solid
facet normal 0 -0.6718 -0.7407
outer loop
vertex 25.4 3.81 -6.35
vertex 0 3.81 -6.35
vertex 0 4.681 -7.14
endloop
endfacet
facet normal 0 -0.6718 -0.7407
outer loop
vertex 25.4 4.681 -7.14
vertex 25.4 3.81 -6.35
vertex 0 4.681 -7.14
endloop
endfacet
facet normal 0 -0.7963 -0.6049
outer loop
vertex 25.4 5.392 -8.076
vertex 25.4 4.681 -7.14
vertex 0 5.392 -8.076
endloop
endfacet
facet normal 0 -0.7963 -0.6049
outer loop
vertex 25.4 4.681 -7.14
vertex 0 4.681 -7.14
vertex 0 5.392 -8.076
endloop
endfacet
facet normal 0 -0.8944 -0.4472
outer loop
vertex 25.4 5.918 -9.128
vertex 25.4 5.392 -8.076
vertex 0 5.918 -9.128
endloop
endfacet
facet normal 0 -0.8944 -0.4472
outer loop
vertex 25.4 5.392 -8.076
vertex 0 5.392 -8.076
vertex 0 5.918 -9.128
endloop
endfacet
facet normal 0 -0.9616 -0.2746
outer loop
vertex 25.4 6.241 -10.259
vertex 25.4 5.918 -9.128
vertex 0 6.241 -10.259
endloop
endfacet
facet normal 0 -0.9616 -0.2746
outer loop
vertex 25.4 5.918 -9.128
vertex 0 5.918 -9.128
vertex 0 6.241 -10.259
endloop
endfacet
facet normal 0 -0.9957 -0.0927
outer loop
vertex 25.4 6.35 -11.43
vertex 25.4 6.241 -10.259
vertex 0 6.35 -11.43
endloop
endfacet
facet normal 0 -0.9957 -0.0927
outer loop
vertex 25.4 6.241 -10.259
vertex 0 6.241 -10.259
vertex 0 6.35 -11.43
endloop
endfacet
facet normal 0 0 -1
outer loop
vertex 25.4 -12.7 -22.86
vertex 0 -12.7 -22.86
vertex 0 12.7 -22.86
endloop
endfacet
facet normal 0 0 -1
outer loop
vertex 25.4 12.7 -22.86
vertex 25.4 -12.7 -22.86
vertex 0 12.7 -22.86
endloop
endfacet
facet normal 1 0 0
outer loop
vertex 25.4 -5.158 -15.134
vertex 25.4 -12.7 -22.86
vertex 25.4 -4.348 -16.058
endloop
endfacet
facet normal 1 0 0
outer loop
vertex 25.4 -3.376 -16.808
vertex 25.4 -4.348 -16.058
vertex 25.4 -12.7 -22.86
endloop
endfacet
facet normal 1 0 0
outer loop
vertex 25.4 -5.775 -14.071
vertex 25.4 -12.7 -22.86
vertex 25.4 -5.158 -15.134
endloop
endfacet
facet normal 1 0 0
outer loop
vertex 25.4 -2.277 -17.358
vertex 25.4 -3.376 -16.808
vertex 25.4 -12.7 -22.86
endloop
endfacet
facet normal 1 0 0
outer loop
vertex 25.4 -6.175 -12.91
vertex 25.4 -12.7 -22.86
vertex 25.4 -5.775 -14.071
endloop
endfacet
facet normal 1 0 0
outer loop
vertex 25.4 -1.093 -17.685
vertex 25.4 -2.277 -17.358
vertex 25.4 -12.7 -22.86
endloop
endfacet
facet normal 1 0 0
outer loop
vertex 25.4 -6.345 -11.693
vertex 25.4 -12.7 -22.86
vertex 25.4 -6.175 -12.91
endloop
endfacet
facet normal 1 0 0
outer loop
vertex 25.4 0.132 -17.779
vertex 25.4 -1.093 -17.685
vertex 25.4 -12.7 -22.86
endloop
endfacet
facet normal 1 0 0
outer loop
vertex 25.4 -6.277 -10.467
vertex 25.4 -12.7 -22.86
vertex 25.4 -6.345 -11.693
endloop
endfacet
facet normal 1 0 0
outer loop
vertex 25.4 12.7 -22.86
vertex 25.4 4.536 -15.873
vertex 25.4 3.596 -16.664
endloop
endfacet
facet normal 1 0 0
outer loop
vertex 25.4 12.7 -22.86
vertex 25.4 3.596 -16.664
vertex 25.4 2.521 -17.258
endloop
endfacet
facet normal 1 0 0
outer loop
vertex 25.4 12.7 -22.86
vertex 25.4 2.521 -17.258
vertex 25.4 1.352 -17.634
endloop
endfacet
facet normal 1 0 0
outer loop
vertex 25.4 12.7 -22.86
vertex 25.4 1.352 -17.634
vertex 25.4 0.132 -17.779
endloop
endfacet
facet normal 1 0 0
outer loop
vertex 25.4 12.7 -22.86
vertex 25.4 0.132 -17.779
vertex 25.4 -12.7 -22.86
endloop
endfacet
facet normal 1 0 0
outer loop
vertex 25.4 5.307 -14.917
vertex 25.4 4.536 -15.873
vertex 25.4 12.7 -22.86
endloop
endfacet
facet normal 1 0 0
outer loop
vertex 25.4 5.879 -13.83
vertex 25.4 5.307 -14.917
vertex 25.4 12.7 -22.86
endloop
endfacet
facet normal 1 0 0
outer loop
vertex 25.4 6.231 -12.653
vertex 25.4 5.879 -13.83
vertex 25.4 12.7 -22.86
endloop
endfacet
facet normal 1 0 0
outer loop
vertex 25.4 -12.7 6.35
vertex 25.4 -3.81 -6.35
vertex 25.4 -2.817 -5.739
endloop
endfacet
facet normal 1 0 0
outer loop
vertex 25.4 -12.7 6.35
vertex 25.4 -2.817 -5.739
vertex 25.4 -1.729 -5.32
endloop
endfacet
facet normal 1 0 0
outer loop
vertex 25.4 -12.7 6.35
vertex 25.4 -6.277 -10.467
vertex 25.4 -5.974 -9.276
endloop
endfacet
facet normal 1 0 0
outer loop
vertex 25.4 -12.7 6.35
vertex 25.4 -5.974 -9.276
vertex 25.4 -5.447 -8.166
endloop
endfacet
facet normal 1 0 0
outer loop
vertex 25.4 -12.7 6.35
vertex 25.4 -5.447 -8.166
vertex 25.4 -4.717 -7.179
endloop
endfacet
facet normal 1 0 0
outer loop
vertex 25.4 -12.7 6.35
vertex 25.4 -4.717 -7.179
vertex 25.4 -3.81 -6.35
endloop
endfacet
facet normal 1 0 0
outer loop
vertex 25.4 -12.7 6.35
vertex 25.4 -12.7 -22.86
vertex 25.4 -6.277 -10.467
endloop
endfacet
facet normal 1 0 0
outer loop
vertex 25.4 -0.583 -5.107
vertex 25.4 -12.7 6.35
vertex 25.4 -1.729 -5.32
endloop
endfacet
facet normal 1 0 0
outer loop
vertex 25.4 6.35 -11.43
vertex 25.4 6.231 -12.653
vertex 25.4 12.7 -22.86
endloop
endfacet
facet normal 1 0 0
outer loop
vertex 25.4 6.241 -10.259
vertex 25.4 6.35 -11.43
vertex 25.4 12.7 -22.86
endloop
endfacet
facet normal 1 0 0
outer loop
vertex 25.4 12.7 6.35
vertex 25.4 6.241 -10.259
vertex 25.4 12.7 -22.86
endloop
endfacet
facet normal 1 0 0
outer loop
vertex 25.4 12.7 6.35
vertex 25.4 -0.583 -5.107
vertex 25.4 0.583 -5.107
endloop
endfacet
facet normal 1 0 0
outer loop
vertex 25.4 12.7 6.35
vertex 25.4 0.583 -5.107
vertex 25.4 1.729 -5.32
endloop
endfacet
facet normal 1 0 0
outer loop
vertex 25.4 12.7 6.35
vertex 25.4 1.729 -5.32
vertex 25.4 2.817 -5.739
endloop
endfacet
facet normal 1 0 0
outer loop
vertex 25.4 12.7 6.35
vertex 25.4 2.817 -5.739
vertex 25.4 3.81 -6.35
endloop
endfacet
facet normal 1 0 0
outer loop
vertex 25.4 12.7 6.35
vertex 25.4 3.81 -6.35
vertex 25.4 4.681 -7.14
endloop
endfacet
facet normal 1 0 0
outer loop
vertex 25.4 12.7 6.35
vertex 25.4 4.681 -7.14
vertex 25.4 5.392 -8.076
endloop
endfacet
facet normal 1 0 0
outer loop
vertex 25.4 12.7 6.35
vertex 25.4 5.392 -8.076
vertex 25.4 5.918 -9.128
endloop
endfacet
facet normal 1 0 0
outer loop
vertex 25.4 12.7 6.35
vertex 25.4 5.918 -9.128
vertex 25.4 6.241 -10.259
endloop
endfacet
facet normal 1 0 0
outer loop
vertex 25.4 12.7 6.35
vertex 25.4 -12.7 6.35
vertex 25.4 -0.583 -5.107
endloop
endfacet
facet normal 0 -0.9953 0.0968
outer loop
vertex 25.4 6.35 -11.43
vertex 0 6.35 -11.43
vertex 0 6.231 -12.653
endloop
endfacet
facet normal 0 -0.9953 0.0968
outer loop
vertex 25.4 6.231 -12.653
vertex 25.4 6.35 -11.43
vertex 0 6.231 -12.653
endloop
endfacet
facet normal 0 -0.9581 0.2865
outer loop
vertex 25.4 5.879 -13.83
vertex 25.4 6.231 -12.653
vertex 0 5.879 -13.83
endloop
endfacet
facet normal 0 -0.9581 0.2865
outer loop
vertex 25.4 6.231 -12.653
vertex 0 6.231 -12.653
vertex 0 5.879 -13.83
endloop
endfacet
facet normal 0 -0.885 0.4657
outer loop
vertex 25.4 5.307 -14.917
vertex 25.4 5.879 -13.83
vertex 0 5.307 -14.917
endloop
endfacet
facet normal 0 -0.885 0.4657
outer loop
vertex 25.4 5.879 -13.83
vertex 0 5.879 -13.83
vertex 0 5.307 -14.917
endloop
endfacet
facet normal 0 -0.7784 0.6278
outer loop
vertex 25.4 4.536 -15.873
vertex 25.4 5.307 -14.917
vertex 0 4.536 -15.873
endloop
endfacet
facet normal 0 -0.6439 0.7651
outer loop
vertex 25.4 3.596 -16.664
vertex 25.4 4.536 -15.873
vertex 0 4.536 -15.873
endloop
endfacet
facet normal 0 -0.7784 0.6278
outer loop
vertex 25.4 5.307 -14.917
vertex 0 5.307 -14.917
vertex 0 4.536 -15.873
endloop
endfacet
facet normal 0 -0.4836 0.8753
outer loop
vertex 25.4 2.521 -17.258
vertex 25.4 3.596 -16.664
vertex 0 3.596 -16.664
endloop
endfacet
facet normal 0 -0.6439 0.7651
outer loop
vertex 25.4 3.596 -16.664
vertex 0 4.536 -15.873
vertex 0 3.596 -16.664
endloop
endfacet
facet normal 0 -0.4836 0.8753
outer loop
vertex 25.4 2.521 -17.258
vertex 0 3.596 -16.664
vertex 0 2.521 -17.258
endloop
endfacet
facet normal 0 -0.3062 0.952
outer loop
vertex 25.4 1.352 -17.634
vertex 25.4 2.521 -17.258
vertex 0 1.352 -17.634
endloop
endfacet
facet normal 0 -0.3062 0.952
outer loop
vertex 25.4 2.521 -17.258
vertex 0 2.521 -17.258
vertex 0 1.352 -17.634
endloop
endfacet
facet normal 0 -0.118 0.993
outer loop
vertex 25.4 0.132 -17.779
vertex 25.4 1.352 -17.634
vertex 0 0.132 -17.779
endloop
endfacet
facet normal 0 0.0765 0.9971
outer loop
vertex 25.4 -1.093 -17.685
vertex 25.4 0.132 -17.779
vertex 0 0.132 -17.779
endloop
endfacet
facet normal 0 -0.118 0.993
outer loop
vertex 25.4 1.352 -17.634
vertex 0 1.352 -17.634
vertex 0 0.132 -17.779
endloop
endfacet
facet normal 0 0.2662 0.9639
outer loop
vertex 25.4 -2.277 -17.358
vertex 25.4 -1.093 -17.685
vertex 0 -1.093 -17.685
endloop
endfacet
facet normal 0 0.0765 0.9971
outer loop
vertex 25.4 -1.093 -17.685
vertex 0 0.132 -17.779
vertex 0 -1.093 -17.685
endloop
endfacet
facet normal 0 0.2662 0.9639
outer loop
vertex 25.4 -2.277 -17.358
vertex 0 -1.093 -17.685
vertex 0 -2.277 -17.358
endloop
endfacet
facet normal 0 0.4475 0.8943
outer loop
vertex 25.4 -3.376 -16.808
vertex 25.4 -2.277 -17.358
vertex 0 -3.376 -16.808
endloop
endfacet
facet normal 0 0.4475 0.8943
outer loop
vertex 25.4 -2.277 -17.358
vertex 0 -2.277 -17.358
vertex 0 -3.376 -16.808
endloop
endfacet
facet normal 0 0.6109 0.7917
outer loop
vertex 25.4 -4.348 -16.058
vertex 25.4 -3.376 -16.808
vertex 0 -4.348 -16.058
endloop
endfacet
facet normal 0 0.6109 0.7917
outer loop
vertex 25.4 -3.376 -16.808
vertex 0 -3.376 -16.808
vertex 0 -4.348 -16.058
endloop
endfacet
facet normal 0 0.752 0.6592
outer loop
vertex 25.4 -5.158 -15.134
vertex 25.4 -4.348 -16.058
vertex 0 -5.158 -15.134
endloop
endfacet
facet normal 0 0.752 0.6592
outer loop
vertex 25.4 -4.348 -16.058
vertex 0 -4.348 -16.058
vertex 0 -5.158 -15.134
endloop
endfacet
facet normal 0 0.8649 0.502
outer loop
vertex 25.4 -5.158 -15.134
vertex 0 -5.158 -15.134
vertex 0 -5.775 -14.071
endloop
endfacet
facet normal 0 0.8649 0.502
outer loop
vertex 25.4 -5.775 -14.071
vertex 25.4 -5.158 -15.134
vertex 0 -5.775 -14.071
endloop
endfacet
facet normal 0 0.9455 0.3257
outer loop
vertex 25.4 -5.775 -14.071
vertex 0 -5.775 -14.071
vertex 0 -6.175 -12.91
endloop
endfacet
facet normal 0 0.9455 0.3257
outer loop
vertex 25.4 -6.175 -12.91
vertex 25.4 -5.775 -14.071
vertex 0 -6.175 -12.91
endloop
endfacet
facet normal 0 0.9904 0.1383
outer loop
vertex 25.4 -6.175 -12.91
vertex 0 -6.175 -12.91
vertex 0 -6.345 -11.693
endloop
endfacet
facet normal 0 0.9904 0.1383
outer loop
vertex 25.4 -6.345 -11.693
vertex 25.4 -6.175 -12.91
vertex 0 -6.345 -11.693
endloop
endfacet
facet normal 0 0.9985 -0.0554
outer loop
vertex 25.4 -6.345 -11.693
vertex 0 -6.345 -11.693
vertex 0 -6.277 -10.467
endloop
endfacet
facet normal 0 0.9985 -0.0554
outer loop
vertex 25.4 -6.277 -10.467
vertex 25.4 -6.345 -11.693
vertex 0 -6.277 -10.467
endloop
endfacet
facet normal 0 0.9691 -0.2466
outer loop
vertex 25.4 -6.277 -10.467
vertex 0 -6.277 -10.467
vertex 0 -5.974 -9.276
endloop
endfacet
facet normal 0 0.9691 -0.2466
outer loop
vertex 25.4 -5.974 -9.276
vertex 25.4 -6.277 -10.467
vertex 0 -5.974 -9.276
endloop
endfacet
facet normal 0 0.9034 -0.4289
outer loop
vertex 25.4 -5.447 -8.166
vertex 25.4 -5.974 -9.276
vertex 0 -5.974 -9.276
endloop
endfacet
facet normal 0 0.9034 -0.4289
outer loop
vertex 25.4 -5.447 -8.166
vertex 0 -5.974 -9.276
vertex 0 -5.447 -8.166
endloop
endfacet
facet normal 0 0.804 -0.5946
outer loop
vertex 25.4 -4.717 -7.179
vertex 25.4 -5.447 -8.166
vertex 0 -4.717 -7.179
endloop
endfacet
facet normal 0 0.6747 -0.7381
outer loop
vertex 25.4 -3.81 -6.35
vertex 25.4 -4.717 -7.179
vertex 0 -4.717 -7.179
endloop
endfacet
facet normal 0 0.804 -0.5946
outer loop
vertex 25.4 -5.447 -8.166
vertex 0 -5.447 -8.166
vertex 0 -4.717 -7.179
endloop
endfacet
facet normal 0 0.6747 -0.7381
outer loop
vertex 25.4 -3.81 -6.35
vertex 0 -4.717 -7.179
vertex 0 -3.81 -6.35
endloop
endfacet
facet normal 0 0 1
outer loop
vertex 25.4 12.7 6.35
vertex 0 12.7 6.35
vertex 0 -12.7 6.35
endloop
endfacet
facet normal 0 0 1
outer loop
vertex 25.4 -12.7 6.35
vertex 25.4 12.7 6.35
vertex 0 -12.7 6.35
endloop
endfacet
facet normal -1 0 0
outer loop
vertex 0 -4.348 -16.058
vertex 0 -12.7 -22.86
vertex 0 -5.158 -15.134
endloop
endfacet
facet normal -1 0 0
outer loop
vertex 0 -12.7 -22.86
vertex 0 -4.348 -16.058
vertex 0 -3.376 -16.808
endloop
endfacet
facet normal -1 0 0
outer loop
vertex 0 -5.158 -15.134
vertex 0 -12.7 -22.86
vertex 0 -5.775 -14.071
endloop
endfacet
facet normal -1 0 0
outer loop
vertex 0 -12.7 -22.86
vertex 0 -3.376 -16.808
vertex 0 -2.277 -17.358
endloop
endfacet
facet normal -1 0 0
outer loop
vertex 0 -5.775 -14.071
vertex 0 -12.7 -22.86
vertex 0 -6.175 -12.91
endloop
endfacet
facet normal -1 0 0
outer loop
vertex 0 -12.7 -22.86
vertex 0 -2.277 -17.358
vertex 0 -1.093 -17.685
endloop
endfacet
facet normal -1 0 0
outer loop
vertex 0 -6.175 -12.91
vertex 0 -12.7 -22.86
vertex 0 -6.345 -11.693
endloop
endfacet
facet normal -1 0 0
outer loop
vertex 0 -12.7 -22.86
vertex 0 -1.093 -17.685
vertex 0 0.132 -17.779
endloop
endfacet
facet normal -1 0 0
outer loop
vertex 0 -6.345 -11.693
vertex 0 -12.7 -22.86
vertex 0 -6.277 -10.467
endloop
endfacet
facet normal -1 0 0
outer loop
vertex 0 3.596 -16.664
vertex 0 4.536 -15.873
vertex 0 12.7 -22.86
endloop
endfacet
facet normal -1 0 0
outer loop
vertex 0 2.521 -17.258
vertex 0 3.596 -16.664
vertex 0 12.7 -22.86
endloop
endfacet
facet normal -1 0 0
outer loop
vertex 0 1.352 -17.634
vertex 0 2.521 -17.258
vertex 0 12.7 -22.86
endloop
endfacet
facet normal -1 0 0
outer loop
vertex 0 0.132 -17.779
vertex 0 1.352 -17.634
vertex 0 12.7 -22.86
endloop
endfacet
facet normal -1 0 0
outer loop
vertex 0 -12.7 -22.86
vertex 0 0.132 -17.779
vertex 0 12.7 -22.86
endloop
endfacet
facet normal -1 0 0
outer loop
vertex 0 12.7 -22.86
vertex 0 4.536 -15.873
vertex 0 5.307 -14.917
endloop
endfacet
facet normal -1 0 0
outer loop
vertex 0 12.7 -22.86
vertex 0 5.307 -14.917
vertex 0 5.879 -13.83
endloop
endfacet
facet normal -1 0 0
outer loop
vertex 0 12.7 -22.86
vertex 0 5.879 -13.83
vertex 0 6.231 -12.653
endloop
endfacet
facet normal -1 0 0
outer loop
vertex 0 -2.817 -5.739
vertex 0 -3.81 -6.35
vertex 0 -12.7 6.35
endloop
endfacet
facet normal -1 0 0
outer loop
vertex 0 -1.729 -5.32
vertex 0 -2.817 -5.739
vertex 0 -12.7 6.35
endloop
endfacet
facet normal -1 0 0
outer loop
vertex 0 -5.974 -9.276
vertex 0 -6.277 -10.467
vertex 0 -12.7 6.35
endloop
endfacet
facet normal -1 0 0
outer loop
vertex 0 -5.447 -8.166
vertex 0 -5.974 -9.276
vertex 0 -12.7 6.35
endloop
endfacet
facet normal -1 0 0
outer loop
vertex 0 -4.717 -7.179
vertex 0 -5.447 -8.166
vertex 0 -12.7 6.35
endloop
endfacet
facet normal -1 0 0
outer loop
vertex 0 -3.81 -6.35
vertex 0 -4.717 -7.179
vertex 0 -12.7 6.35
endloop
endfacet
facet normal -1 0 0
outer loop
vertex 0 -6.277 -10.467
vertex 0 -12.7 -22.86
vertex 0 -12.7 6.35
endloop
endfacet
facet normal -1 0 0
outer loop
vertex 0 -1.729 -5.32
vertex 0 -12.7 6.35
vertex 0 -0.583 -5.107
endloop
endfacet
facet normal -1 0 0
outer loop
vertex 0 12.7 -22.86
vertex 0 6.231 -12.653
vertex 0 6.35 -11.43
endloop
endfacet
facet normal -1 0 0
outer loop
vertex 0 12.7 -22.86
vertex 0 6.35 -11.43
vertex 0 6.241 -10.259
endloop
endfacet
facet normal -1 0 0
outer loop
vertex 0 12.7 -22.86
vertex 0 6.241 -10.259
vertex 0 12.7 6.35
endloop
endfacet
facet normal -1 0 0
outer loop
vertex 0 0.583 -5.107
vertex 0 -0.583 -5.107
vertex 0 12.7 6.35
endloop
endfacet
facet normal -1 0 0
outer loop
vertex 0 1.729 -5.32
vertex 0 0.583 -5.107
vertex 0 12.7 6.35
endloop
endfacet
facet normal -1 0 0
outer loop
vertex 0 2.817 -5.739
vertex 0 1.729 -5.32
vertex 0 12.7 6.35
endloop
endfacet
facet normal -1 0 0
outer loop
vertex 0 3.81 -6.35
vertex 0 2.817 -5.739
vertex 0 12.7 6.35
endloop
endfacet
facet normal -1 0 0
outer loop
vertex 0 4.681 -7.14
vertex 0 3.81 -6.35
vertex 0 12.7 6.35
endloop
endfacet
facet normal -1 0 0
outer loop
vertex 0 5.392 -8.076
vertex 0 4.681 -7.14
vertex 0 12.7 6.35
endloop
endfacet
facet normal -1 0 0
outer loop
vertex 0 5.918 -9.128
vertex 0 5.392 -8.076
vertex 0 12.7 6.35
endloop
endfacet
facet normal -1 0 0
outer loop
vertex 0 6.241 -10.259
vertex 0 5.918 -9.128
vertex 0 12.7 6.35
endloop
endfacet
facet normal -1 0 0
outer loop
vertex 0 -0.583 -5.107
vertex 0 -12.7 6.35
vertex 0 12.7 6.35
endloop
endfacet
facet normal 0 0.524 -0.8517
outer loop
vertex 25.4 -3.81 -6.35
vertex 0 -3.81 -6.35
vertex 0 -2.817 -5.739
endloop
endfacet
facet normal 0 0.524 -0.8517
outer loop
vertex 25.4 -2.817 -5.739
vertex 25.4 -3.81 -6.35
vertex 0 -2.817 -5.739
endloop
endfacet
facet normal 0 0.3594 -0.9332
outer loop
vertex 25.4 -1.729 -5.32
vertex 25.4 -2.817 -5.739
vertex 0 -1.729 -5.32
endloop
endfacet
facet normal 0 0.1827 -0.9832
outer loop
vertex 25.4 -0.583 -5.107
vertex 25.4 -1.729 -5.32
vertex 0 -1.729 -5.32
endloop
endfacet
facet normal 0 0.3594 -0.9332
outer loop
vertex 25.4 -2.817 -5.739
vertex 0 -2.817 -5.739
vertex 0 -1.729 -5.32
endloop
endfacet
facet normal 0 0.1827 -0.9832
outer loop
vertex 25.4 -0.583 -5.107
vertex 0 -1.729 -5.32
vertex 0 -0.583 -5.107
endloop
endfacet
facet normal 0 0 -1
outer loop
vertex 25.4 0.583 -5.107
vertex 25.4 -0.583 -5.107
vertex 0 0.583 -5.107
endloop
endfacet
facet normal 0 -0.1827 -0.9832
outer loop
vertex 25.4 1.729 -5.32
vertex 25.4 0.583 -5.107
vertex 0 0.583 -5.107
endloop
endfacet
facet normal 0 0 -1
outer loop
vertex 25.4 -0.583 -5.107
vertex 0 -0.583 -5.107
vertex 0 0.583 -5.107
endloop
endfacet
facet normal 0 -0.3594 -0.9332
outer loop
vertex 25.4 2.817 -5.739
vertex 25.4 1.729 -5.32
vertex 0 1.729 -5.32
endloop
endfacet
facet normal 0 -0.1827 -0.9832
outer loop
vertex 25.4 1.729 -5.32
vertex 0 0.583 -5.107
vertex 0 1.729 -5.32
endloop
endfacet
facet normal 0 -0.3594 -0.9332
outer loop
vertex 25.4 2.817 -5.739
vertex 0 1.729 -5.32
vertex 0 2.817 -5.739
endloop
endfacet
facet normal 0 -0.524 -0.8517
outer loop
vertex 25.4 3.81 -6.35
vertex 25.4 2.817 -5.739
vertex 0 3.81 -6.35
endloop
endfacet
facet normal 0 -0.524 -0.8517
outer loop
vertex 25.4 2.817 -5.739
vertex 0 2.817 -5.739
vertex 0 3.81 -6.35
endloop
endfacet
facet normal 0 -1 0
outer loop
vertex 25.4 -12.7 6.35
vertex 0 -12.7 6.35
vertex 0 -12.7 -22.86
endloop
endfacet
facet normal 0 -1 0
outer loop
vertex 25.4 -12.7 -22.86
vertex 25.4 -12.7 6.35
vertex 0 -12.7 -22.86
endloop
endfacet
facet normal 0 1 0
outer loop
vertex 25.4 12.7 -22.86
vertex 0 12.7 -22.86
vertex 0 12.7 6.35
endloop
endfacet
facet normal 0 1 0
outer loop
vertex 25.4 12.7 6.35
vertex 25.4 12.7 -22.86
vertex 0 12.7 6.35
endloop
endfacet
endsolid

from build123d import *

# Parameters (mm, degrees)
F1_DEPTH = 25.4


with BuildPart() as f1:
    # F0 (on Right) → F1 (new body)
    with BuildSketch(Plane.YZ):
        with BuildLine():
            Line((3.81, -6.35), (12.7, -6.35))
            Line((12.7, -6.35), (12.7, 6.35))
            Line((12.7, 6.35), (-12.7, 6.35))
            Line((-12.7, 6.35), (-12.7, -6.35))
            Line((-12.7, -6.35), (-3.81, -6.35))
            ThreePointArc((-3.81, -6.35), (0, -5.08), (3.81, -6.35))
        make_face()
        with BuildLine():
            Line((12.7, -22.86), (12.7, -6.35))
            Line((12.7, -6.35), (3.81, -6.35))
            ThreePointArc((3.81, -6.35), (5.679613, -8.590194), (6.35, -11.43))
            ThreePointArc((6.35, -11.43), (-2.839806, -17.109613), (-3.81, -6.35))
            Line((-3.81, -6.35), (-12.7, -6.35))
            Line((-12.7, -6.35), (-12.7, -22.86))
            Line((-12.7, -22.86), (12.7, -22.86))
        make_face()
    extrude(amount=F1_DEPTH)


solid = f1.part
